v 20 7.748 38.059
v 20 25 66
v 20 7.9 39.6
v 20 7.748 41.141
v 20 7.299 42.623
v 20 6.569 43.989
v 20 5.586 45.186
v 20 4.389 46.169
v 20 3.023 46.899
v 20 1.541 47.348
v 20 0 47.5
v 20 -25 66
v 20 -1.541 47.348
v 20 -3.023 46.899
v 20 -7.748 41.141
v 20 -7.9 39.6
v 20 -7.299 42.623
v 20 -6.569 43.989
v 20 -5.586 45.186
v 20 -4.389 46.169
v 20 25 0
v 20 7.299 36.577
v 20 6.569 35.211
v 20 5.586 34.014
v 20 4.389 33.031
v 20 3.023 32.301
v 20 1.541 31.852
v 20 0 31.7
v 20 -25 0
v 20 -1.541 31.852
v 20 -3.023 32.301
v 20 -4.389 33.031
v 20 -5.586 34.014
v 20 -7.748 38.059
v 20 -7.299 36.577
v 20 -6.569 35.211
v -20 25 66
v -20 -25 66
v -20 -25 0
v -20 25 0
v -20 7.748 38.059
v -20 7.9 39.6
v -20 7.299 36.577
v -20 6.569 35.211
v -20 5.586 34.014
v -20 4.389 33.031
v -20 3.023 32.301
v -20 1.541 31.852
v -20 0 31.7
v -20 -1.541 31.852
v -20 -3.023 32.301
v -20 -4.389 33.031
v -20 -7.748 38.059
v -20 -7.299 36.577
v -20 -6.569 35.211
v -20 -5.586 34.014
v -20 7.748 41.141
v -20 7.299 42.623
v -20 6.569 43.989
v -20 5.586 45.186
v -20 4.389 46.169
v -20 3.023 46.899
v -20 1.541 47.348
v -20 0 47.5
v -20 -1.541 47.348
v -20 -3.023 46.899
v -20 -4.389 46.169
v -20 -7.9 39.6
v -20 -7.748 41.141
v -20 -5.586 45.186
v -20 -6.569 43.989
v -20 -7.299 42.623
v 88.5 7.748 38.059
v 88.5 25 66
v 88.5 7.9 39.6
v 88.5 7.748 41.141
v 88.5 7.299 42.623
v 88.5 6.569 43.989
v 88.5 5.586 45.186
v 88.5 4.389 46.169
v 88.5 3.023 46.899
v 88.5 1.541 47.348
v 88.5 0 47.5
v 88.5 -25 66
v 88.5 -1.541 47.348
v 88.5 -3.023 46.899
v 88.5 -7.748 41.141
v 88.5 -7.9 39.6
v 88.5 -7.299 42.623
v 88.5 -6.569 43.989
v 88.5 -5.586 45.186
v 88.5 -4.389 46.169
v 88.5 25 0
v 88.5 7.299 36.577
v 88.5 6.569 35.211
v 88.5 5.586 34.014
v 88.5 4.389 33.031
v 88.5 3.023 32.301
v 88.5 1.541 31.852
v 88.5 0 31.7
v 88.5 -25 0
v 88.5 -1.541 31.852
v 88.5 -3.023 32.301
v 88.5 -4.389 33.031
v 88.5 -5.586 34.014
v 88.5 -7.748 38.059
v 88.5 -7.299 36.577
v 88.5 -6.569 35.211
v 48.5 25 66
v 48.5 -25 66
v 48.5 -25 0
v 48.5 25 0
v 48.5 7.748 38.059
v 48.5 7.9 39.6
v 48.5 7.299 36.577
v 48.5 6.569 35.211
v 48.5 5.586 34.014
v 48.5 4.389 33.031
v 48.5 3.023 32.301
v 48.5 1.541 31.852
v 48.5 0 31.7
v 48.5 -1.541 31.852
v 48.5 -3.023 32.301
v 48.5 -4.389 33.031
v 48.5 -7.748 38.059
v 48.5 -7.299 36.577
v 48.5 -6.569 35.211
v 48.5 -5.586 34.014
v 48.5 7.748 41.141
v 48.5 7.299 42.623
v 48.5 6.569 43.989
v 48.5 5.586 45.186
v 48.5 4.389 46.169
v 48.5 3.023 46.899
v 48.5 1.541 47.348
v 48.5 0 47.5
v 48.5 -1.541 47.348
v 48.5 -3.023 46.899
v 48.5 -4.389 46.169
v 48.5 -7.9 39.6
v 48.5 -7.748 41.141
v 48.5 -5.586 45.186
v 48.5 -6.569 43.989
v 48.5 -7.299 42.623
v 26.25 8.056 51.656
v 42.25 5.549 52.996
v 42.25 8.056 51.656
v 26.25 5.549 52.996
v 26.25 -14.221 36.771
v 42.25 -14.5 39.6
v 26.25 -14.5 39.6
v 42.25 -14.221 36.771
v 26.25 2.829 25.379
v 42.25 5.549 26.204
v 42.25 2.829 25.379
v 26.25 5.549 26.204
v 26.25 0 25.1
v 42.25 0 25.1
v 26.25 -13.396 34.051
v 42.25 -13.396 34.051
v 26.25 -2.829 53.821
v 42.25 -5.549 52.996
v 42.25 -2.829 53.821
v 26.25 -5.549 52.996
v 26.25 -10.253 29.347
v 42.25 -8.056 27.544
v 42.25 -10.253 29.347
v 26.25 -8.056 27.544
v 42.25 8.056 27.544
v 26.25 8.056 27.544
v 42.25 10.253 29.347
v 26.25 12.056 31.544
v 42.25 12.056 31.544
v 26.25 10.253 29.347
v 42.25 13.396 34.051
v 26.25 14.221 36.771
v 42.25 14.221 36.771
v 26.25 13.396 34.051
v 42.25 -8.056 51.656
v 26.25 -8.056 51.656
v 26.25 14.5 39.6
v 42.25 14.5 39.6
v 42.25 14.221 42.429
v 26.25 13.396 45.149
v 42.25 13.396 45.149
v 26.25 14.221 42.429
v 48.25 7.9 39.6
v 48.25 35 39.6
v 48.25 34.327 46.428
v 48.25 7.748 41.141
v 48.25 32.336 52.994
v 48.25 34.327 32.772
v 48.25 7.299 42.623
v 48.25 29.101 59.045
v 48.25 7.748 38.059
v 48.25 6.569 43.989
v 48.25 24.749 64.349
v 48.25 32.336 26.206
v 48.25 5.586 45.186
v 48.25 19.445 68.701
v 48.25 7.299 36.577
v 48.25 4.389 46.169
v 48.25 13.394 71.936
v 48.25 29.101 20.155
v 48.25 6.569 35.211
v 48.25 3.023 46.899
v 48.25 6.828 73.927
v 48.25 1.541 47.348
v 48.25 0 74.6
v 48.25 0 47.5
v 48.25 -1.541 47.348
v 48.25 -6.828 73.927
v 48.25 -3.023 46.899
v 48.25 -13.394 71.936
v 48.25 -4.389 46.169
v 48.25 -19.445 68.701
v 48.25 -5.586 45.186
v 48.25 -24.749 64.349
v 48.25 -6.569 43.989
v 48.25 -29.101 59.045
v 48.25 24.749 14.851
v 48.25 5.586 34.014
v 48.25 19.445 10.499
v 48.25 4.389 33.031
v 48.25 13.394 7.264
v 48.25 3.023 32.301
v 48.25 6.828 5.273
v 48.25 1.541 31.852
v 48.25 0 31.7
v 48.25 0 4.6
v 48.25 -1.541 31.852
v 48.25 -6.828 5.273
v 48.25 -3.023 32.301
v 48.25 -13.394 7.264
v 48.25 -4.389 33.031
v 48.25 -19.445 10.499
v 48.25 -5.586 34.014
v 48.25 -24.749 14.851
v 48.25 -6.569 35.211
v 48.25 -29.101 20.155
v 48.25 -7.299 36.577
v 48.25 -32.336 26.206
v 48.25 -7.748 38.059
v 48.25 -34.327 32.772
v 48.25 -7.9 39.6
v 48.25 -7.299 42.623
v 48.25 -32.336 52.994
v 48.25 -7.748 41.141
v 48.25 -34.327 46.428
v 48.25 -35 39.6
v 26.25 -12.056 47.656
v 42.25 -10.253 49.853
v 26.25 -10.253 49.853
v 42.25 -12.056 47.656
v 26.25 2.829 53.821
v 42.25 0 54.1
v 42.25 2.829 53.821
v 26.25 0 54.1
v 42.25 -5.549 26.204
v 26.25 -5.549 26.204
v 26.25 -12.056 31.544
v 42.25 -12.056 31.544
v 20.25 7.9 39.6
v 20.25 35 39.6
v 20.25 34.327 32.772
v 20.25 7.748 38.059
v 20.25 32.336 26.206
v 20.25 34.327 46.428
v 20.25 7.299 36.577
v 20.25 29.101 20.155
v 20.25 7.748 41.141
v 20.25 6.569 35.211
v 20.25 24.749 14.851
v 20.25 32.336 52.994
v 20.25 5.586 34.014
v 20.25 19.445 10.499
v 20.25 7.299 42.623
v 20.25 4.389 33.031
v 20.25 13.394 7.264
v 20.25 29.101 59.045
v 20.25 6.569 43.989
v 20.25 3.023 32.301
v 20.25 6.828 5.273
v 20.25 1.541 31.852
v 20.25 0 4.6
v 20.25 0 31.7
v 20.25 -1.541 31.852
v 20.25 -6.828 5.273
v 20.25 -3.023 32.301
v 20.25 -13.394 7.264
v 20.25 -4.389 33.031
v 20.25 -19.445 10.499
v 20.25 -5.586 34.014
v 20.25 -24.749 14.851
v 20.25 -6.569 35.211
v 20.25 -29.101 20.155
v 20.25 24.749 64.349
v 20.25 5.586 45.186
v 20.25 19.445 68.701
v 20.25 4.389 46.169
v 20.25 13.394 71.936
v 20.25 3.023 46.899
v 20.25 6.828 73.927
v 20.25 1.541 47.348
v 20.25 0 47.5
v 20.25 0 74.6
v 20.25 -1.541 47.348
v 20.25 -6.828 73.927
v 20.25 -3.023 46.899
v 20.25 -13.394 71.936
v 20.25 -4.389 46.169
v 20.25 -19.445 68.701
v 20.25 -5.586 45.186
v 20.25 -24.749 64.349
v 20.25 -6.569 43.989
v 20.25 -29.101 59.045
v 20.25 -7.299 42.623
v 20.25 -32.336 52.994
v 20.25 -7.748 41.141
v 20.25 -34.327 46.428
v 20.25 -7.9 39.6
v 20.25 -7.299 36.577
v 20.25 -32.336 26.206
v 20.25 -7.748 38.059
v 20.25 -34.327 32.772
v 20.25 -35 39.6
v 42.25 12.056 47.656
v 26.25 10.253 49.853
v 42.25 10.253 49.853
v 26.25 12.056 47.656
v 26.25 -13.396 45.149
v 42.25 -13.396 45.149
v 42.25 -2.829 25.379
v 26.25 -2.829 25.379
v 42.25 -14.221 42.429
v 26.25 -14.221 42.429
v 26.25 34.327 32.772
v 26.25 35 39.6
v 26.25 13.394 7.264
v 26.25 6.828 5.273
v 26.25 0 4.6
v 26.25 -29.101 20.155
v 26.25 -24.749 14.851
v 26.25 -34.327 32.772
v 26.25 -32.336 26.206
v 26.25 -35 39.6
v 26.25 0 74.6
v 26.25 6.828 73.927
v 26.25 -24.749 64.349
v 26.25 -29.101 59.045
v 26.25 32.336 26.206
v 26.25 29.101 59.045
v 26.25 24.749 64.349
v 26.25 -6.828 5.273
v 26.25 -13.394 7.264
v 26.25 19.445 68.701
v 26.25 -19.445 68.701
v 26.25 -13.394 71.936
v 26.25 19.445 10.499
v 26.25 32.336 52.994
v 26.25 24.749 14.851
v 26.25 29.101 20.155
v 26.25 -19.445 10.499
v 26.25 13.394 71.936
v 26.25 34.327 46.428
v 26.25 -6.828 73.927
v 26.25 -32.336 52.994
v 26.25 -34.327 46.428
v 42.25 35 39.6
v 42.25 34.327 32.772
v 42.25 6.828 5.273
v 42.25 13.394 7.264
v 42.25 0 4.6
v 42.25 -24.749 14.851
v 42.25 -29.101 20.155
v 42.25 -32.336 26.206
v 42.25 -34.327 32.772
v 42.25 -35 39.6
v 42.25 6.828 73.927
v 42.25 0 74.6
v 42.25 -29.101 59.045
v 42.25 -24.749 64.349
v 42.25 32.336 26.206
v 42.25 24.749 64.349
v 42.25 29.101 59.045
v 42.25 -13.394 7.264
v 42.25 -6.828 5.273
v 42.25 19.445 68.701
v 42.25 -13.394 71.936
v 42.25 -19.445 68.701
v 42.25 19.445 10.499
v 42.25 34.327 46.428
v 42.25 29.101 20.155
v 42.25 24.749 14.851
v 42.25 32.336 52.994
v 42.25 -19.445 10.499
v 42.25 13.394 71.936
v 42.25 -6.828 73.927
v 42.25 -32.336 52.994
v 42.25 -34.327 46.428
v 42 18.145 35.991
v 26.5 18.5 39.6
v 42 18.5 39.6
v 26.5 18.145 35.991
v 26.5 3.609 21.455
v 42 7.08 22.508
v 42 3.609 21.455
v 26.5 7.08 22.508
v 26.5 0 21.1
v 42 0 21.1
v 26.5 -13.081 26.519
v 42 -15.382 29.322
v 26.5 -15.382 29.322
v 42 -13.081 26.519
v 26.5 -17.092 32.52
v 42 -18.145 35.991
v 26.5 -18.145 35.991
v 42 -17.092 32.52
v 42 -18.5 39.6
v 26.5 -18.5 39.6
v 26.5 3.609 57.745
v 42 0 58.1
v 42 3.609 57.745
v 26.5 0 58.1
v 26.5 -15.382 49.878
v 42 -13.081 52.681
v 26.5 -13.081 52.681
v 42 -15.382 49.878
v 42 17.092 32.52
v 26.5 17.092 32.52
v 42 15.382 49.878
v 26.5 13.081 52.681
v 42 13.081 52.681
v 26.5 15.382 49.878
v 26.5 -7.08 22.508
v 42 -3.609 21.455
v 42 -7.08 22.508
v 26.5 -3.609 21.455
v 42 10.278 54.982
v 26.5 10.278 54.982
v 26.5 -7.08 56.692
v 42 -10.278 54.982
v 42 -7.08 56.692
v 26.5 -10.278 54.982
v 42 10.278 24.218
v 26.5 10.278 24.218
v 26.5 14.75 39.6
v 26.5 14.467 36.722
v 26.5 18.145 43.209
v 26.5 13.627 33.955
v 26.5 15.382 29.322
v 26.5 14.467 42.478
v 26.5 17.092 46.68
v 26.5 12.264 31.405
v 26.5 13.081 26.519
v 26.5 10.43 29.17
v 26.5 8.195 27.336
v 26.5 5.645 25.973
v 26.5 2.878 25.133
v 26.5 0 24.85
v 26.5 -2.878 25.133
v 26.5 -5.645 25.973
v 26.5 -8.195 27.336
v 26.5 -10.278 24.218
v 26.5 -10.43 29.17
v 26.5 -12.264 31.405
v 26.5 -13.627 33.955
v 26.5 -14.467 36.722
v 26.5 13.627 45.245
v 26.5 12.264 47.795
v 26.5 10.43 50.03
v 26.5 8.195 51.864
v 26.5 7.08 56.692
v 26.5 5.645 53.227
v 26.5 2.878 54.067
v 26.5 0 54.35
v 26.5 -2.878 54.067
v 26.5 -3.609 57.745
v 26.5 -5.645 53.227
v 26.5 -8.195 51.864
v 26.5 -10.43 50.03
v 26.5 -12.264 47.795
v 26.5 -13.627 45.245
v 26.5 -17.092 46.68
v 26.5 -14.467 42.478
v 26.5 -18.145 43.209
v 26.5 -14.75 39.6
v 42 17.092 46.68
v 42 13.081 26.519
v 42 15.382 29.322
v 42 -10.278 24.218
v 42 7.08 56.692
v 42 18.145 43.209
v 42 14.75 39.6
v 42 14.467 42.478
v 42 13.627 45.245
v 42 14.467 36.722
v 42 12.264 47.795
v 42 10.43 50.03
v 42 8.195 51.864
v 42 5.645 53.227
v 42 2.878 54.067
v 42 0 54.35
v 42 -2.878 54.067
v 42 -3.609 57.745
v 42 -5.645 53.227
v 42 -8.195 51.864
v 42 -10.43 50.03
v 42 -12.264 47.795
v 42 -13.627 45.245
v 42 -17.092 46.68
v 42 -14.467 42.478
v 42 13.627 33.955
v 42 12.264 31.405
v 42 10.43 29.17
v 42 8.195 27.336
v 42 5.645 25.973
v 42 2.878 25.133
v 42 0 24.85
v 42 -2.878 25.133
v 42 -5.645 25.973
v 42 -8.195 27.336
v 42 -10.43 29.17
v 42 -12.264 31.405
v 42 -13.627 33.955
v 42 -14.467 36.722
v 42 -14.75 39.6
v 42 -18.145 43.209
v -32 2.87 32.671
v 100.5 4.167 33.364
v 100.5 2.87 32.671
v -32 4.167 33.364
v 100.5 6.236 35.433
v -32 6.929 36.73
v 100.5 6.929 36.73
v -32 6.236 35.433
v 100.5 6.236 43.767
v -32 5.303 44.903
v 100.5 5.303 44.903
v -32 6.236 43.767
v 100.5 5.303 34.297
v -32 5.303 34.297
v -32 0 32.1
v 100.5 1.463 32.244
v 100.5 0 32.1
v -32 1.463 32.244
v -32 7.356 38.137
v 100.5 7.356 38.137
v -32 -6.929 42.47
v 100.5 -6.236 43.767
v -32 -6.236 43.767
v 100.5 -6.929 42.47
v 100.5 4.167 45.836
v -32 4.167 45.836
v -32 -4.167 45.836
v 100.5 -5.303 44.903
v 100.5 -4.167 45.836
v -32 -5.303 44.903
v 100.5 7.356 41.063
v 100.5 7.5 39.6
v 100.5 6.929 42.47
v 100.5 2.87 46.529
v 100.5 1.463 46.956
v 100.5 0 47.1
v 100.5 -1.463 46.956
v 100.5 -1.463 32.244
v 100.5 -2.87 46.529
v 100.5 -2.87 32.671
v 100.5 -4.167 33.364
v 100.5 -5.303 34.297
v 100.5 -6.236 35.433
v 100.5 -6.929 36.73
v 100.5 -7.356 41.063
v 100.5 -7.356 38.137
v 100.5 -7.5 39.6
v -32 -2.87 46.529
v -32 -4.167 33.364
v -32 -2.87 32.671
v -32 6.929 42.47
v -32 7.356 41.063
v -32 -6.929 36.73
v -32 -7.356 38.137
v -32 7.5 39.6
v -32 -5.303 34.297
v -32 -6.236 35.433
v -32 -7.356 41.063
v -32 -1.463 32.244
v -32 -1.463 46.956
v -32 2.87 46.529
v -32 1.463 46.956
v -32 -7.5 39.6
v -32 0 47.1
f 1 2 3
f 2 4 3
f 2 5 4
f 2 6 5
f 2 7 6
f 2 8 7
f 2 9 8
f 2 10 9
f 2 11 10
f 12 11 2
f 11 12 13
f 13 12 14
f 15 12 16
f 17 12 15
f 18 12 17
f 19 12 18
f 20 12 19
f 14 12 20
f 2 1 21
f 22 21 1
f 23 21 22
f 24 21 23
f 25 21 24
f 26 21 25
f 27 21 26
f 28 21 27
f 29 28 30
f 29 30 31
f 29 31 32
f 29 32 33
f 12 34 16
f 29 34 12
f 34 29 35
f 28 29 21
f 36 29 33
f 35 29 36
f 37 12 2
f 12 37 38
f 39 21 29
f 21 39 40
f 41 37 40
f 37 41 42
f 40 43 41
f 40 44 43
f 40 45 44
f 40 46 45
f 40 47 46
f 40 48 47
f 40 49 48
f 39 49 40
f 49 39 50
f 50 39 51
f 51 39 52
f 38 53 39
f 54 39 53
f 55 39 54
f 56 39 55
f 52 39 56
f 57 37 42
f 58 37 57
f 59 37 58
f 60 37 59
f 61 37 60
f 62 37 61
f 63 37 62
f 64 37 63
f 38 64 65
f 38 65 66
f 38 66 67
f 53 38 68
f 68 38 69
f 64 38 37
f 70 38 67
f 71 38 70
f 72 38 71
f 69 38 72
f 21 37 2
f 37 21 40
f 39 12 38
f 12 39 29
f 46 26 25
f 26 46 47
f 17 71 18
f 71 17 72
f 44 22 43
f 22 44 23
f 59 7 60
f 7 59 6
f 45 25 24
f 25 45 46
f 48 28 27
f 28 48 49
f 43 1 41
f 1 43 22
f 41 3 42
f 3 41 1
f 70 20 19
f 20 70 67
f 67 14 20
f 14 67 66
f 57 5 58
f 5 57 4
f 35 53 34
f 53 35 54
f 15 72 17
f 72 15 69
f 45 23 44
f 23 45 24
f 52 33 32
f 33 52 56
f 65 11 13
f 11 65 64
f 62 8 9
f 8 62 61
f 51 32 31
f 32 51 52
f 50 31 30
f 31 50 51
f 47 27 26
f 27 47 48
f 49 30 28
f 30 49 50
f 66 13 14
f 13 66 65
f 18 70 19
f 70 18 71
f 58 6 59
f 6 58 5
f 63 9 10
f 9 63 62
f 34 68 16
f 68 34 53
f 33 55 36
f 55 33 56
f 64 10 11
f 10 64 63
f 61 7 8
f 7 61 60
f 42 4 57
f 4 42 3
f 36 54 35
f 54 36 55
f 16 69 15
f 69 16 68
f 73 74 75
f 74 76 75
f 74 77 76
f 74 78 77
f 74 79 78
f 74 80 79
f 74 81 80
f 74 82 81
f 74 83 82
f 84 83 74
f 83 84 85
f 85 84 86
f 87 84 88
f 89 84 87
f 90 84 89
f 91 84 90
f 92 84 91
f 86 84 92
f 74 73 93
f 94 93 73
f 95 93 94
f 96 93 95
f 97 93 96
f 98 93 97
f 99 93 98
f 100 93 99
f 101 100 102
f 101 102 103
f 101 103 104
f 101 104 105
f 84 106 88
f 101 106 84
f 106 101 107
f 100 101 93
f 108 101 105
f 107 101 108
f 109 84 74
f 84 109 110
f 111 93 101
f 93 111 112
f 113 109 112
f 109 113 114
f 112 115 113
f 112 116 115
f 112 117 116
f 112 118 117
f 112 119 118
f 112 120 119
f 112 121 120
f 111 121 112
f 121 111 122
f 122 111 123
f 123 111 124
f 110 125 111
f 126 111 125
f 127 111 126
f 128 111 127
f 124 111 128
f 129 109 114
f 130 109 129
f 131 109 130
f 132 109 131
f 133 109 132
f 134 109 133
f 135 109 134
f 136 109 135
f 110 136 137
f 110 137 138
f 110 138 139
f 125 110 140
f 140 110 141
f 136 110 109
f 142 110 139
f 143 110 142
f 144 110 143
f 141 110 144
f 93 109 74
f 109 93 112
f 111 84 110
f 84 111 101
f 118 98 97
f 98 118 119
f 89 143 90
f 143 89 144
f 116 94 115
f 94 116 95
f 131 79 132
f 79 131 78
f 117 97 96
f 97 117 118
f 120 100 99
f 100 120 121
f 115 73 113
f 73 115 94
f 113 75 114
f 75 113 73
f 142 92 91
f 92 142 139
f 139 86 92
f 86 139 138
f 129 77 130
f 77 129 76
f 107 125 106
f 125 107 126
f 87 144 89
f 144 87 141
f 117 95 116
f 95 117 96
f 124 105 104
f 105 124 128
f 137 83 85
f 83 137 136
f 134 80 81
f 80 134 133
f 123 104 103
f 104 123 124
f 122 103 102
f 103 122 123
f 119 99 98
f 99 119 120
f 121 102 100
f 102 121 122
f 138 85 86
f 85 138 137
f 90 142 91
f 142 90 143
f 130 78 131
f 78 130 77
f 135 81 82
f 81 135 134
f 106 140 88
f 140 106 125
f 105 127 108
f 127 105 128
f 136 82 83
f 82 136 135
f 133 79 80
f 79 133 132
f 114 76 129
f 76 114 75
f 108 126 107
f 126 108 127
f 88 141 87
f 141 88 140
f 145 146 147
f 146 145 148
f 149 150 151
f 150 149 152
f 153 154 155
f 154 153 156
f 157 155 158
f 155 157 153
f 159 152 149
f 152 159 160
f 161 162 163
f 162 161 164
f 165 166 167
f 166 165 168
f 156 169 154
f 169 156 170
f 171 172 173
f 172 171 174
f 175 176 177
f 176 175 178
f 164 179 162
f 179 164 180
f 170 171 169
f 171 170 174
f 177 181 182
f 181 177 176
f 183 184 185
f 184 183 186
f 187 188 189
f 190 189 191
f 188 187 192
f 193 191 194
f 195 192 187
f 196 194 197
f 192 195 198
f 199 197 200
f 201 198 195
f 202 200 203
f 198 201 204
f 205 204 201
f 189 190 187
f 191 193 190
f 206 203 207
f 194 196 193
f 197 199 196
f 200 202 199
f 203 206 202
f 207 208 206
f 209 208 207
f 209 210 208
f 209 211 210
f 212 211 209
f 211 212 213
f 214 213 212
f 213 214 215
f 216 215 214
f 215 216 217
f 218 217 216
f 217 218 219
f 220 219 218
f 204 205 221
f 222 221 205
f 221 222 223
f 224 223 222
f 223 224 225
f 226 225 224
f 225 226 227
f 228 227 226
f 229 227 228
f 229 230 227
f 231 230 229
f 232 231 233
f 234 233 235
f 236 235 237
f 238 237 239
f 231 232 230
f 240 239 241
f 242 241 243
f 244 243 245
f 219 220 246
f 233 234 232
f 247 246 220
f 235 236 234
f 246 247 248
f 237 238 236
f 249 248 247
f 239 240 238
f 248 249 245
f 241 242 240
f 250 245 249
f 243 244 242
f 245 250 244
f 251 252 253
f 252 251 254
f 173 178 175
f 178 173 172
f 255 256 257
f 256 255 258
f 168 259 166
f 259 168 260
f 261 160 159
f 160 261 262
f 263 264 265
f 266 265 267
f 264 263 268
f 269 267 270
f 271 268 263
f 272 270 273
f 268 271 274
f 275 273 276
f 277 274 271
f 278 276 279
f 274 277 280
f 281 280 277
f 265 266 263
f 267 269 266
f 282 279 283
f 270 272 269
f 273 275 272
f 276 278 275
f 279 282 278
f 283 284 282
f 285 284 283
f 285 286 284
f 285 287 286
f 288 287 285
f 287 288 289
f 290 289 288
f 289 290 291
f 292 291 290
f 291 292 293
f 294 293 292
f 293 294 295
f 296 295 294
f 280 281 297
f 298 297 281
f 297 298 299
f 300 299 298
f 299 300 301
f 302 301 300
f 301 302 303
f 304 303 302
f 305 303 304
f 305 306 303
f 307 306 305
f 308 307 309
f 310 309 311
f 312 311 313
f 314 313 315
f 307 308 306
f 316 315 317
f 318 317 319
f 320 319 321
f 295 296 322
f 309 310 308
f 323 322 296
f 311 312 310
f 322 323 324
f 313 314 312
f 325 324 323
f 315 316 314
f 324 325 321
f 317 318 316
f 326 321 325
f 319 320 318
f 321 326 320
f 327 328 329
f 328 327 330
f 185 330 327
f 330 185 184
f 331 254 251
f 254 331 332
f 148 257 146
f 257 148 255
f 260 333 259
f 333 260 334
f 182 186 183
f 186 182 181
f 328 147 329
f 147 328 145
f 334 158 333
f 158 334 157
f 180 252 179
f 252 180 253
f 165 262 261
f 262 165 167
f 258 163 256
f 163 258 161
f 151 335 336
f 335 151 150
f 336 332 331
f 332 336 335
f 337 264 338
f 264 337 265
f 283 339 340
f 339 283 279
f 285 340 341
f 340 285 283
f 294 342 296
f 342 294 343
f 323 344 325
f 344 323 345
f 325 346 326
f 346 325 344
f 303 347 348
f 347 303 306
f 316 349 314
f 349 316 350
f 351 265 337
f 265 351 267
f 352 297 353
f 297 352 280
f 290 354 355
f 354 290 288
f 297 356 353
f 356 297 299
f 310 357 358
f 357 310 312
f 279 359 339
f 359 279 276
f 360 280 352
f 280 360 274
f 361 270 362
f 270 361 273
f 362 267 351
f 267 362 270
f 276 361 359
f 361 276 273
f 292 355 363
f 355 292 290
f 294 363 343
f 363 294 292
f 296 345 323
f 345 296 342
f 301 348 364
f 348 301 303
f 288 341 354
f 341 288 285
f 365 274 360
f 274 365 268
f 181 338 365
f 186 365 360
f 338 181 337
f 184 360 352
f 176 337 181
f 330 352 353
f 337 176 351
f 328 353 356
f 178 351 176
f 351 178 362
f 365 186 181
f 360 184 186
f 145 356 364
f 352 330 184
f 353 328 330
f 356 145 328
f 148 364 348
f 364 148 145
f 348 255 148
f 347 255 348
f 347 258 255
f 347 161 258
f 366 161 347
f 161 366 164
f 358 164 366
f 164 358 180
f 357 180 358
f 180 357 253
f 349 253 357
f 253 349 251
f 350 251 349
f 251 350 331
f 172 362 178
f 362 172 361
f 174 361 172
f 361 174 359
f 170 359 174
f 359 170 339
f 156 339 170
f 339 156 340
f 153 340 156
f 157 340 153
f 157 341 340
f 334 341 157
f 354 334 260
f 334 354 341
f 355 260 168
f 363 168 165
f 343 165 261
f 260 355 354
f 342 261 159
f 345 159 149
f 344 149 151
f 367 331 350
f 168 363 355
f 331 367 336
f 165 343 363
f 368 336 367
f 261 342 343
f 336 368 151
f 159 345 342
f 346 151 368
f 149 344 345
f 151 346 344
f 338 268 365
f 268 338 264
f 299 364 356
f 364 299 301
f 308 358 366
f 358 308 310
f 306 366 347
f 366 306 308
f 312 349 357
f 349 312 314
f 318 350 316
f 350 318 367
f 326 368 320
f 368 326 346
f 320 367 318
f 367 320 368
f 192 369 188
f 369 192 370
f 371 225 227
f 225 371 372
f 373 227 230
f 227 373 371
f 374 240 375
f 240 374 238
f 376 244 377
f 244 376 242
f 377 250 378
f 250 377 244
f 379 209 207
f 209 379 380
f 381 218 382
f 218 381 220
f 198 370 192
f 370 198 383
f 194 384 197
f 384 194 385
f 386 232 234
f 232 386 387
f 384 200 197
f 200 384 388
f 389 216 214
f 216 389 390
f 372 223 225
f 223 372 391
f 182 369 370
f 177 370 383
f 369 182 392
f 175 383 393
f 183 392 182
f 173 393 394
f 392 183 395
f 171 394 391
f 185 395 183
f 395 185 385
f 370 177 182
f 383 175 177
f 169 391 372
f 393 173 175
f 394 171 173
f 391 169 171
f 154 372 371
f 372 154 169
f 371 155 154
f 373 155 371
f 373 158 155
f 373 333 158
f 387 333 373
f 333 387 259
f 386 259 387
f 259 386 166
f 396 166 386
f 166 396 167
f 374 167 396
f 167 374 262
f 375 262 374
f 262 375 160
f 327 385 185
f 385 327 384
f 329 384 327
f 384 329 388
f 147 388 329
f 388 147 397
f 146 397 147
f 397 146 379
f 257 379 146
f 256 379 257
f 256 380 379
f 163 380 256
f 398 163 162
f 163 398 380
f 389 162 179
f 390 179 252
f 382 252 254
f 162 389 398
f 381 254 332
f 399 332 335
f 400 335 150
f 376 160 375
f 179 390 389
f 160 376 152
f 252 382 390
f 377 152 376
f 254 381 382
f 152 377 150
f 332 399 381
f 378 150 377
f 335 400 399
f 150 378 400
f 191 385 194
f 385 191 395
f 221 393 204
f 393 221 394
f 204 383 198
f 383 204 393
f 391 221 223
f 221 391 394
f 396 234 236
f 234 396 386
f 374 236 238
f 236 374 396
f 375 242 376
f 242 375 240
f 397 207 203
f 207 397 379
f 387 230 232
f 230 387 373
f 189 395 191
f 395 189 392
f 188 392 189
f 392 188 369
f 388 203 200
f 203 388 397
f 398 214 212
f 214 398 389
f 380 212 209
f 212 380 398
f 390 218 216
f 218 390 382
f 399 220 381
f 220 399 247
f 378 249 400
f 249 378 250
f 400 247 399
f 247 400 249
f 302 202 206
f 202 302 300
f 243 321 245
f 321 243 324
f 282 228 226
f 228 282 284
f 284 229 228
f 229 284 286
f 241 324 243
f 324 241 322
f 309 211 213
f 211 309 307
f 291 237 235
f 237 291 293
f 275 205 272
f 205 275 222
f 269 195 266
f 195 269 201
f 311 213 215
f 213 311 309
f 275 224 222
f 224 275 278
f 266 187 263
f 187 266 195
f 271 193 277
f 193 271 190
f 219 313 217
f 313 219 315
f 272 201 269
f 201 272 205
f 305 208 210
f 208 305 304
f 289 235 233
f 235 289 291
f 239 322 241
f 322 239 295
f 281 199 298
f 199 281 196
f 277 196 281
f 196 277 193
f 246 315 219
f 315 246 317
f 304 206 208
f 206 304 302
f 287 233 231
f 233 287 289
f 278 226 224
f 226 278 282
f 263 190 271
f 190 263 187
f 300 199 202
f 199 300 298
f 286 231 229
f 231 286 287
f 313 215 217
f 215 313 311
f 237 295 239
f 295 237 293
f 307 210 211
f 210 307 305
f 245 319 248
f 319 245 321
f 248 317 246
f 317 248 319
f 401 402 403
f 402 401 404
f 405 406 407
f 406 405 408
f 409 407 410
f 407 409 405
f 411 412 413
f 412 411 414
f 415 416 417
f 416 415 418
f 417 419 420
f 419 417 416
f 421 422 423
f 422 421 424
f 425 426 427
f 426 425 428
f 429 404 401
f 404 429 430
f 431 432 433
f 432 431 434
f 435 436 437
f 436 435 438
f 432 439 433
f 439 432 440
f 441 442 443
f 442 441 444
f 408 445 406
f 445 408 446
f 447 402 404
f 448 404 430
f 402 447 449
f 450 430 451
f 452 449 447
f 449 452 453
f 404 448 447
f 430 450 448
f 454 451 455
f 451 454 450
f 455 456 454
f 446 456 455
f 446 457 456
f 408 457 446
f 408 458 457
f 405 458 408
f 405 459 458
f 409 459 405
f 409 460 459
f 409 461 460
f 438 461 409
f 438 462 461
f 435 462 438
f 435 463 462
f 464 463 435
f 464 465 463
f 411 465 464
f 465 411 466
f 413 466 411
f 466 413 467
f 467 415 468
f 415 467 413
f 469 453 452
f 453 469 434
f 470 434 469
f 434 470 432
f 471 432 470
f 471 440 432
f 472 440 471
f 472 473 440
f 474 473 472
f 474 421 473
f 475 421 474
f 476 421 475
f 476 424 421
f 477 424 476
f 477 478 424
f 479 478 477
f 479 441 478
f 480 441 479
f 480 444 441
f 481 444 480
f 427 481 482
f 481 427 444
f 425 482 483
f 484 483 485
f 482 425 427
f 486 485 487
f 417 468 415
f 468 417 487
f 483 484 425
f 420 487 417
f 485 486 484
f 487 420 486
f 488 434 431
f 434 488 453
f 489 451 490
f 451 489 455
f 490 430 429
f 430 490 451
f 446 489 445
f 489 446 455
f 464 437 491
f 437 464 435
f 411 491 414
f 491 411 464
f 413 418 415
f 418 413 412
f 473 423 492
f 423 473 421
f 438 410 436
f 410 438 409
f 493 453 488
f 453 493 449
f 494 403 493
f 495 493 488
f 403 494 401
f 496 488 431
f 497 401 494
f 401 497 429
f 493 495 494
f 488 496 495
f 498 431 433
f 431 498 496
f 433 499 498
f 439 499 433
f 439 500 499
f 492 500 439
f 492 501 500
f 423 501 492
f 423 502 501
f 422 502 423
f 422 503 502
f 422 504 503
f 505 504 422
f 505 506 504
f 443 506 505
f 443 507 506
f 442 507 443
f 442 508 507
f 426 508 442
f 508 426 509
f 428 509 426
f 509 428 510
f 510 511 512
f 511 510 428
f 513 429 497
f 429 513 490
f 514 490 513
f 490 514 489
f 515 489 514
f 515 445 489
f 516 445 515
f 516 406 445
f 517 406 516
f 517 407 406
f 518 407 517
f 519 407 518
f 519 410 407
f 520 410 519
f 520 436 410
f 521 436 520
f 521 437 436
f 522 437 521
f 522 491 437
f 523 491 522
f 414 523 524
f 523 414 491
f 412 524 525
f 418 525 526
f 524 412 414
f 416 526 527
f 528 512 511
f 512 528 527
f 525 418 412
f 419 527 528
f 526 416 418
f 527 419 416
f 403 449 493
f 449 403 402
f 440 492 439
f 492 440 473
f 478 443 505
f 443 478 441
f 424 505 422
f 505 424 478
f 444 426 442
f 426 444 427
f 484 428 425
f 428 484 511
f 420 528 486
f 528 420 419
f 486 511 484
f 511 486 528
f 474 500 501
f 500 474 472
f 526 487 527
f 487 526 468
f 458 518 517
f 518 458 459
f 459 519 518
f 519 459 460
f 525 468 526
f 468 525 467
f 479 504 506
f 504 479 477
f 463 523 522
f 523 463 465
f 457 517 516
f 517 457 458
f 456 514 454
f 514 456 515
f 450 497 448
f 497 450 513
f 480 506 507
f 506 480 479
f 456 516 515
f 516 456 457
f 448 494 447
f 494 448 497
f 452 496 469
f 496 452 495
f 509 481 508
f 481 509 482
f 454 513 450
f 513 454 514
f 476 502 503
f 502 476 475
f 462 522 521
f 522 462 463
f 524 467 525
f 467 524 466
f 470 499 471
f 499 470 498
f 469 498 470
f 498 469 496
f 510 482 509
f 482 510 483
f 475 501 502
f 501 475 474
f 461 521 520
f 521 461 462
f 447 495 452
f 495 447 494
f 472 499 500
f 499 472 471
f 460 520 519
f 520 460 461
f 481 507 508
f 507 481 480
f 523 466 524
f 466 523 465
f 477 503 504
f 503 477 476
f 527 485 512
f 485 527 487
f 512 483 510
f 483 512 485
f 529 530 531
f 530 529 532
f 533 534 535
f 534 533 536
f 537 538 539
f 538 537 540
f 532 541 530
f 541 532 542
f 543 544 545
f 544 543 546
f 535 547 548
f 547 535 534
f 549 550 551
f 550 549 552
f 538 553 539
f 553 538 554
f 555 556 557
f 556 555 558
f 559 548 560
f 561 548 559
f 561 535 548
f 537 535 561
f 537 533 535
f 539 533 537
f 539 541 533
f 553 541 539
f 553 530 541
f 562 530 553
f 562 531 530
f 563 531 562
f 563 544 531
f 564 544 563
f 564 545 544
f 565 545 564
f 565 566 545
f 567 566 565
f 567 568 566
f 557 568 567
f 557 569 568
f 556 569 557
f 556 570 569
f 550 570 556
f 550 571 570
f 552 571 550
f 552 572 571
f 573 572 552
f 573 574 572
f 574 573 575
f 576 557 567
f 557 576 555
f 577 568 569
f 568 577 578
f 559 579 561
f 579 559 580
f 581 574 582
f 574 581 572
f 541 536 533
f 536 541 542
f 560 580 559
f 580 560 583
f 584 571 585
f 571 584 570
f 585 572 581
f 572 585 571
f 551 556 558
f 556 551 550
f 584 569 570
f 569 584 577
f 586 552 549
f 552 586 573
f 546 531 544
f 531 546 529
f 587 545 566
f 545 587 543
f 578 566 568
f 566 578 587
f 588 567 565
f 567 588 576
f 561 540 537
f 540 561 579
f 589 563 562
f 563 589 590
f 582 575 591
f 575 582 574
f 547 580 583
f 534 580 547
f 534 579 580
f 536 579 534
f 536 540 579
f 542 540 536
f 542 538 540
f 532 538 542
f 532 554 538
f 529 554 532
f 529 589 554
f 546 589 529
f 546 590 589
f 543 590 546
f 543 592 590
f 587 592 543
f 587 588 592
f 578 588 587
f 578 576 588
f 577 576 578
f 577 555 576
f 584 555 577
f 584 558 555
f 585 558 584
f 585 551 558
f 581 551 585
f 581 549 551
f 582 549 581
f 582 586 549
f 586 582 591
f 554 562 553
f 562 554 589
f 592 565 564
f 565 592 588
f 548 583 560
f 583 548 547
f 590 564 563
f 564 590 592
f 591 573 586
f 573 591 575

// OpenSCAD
$fn = 32;

// ------------------------------------------------------------------------
// Pulley assembly: d70 pulley with a belt, shaft d15
// Every part is its own module, assembly() places them once.
// ------------------------------------------------------------------------

// --- part 1 ---
module support1() {
  difference() {
    translate([-20, -25, 0]) cube([40, 50, 66]);
    translate([0, 0, 39.6]) rotate([0, 90, 0]) cylinder(h = 42, d = 15.8, center = true);
  }
}

// --- part 2 ---
module support2() {
  difference() {
    translate([-20, -25, 0]) cube([40, 50, 66]);
    translate([0, 0, 39.6]) rotate([0, 90, 0]) cylinder(h = 42, d = 15.8, center = true);
  }
}

// --- part 3 ---
module shaft() {
  translate([0, 0, -66.25]) cylinder(h = 132.5, d = 15);
}

// --- part 4 ---
module pulley() {
  difference() {
    union() {
      cylinder(h = 28, d = 29);
      cylinder(h = 6, d = 70);
      translate([0, 0, 22]) cylinder(h = 6, d = 70);
    }
    translate([0, 0, -1]) cylinder(h = 30, d = 15.8);
  }
}

// --- part 5 ---
module belt() {
  difference() {
      translate([0, 0, 0]) cylinder(h = 15.5, d = 37);
      translate([0, 0, -1]) cylinder(h = 17.5, d = 29.5);
    }
}

// --- assembly ---
module assembly() {
  translate([0, 0, 0]) rotate([0, 0, 0]) support1();
  translate([68.5, 0, 0]) rotate([0, 0, 0]) support2();
  translate([34.25, 0, 39.6]) rotate([0, 90, 0]) shaft();
  translate([20.25, 0, 39.6]) rotate([0, 90, 0]) pulley();
  translate([26.5, 0, 39.6]) rotate([0, 90, 0]) belt();
}

assembly();
